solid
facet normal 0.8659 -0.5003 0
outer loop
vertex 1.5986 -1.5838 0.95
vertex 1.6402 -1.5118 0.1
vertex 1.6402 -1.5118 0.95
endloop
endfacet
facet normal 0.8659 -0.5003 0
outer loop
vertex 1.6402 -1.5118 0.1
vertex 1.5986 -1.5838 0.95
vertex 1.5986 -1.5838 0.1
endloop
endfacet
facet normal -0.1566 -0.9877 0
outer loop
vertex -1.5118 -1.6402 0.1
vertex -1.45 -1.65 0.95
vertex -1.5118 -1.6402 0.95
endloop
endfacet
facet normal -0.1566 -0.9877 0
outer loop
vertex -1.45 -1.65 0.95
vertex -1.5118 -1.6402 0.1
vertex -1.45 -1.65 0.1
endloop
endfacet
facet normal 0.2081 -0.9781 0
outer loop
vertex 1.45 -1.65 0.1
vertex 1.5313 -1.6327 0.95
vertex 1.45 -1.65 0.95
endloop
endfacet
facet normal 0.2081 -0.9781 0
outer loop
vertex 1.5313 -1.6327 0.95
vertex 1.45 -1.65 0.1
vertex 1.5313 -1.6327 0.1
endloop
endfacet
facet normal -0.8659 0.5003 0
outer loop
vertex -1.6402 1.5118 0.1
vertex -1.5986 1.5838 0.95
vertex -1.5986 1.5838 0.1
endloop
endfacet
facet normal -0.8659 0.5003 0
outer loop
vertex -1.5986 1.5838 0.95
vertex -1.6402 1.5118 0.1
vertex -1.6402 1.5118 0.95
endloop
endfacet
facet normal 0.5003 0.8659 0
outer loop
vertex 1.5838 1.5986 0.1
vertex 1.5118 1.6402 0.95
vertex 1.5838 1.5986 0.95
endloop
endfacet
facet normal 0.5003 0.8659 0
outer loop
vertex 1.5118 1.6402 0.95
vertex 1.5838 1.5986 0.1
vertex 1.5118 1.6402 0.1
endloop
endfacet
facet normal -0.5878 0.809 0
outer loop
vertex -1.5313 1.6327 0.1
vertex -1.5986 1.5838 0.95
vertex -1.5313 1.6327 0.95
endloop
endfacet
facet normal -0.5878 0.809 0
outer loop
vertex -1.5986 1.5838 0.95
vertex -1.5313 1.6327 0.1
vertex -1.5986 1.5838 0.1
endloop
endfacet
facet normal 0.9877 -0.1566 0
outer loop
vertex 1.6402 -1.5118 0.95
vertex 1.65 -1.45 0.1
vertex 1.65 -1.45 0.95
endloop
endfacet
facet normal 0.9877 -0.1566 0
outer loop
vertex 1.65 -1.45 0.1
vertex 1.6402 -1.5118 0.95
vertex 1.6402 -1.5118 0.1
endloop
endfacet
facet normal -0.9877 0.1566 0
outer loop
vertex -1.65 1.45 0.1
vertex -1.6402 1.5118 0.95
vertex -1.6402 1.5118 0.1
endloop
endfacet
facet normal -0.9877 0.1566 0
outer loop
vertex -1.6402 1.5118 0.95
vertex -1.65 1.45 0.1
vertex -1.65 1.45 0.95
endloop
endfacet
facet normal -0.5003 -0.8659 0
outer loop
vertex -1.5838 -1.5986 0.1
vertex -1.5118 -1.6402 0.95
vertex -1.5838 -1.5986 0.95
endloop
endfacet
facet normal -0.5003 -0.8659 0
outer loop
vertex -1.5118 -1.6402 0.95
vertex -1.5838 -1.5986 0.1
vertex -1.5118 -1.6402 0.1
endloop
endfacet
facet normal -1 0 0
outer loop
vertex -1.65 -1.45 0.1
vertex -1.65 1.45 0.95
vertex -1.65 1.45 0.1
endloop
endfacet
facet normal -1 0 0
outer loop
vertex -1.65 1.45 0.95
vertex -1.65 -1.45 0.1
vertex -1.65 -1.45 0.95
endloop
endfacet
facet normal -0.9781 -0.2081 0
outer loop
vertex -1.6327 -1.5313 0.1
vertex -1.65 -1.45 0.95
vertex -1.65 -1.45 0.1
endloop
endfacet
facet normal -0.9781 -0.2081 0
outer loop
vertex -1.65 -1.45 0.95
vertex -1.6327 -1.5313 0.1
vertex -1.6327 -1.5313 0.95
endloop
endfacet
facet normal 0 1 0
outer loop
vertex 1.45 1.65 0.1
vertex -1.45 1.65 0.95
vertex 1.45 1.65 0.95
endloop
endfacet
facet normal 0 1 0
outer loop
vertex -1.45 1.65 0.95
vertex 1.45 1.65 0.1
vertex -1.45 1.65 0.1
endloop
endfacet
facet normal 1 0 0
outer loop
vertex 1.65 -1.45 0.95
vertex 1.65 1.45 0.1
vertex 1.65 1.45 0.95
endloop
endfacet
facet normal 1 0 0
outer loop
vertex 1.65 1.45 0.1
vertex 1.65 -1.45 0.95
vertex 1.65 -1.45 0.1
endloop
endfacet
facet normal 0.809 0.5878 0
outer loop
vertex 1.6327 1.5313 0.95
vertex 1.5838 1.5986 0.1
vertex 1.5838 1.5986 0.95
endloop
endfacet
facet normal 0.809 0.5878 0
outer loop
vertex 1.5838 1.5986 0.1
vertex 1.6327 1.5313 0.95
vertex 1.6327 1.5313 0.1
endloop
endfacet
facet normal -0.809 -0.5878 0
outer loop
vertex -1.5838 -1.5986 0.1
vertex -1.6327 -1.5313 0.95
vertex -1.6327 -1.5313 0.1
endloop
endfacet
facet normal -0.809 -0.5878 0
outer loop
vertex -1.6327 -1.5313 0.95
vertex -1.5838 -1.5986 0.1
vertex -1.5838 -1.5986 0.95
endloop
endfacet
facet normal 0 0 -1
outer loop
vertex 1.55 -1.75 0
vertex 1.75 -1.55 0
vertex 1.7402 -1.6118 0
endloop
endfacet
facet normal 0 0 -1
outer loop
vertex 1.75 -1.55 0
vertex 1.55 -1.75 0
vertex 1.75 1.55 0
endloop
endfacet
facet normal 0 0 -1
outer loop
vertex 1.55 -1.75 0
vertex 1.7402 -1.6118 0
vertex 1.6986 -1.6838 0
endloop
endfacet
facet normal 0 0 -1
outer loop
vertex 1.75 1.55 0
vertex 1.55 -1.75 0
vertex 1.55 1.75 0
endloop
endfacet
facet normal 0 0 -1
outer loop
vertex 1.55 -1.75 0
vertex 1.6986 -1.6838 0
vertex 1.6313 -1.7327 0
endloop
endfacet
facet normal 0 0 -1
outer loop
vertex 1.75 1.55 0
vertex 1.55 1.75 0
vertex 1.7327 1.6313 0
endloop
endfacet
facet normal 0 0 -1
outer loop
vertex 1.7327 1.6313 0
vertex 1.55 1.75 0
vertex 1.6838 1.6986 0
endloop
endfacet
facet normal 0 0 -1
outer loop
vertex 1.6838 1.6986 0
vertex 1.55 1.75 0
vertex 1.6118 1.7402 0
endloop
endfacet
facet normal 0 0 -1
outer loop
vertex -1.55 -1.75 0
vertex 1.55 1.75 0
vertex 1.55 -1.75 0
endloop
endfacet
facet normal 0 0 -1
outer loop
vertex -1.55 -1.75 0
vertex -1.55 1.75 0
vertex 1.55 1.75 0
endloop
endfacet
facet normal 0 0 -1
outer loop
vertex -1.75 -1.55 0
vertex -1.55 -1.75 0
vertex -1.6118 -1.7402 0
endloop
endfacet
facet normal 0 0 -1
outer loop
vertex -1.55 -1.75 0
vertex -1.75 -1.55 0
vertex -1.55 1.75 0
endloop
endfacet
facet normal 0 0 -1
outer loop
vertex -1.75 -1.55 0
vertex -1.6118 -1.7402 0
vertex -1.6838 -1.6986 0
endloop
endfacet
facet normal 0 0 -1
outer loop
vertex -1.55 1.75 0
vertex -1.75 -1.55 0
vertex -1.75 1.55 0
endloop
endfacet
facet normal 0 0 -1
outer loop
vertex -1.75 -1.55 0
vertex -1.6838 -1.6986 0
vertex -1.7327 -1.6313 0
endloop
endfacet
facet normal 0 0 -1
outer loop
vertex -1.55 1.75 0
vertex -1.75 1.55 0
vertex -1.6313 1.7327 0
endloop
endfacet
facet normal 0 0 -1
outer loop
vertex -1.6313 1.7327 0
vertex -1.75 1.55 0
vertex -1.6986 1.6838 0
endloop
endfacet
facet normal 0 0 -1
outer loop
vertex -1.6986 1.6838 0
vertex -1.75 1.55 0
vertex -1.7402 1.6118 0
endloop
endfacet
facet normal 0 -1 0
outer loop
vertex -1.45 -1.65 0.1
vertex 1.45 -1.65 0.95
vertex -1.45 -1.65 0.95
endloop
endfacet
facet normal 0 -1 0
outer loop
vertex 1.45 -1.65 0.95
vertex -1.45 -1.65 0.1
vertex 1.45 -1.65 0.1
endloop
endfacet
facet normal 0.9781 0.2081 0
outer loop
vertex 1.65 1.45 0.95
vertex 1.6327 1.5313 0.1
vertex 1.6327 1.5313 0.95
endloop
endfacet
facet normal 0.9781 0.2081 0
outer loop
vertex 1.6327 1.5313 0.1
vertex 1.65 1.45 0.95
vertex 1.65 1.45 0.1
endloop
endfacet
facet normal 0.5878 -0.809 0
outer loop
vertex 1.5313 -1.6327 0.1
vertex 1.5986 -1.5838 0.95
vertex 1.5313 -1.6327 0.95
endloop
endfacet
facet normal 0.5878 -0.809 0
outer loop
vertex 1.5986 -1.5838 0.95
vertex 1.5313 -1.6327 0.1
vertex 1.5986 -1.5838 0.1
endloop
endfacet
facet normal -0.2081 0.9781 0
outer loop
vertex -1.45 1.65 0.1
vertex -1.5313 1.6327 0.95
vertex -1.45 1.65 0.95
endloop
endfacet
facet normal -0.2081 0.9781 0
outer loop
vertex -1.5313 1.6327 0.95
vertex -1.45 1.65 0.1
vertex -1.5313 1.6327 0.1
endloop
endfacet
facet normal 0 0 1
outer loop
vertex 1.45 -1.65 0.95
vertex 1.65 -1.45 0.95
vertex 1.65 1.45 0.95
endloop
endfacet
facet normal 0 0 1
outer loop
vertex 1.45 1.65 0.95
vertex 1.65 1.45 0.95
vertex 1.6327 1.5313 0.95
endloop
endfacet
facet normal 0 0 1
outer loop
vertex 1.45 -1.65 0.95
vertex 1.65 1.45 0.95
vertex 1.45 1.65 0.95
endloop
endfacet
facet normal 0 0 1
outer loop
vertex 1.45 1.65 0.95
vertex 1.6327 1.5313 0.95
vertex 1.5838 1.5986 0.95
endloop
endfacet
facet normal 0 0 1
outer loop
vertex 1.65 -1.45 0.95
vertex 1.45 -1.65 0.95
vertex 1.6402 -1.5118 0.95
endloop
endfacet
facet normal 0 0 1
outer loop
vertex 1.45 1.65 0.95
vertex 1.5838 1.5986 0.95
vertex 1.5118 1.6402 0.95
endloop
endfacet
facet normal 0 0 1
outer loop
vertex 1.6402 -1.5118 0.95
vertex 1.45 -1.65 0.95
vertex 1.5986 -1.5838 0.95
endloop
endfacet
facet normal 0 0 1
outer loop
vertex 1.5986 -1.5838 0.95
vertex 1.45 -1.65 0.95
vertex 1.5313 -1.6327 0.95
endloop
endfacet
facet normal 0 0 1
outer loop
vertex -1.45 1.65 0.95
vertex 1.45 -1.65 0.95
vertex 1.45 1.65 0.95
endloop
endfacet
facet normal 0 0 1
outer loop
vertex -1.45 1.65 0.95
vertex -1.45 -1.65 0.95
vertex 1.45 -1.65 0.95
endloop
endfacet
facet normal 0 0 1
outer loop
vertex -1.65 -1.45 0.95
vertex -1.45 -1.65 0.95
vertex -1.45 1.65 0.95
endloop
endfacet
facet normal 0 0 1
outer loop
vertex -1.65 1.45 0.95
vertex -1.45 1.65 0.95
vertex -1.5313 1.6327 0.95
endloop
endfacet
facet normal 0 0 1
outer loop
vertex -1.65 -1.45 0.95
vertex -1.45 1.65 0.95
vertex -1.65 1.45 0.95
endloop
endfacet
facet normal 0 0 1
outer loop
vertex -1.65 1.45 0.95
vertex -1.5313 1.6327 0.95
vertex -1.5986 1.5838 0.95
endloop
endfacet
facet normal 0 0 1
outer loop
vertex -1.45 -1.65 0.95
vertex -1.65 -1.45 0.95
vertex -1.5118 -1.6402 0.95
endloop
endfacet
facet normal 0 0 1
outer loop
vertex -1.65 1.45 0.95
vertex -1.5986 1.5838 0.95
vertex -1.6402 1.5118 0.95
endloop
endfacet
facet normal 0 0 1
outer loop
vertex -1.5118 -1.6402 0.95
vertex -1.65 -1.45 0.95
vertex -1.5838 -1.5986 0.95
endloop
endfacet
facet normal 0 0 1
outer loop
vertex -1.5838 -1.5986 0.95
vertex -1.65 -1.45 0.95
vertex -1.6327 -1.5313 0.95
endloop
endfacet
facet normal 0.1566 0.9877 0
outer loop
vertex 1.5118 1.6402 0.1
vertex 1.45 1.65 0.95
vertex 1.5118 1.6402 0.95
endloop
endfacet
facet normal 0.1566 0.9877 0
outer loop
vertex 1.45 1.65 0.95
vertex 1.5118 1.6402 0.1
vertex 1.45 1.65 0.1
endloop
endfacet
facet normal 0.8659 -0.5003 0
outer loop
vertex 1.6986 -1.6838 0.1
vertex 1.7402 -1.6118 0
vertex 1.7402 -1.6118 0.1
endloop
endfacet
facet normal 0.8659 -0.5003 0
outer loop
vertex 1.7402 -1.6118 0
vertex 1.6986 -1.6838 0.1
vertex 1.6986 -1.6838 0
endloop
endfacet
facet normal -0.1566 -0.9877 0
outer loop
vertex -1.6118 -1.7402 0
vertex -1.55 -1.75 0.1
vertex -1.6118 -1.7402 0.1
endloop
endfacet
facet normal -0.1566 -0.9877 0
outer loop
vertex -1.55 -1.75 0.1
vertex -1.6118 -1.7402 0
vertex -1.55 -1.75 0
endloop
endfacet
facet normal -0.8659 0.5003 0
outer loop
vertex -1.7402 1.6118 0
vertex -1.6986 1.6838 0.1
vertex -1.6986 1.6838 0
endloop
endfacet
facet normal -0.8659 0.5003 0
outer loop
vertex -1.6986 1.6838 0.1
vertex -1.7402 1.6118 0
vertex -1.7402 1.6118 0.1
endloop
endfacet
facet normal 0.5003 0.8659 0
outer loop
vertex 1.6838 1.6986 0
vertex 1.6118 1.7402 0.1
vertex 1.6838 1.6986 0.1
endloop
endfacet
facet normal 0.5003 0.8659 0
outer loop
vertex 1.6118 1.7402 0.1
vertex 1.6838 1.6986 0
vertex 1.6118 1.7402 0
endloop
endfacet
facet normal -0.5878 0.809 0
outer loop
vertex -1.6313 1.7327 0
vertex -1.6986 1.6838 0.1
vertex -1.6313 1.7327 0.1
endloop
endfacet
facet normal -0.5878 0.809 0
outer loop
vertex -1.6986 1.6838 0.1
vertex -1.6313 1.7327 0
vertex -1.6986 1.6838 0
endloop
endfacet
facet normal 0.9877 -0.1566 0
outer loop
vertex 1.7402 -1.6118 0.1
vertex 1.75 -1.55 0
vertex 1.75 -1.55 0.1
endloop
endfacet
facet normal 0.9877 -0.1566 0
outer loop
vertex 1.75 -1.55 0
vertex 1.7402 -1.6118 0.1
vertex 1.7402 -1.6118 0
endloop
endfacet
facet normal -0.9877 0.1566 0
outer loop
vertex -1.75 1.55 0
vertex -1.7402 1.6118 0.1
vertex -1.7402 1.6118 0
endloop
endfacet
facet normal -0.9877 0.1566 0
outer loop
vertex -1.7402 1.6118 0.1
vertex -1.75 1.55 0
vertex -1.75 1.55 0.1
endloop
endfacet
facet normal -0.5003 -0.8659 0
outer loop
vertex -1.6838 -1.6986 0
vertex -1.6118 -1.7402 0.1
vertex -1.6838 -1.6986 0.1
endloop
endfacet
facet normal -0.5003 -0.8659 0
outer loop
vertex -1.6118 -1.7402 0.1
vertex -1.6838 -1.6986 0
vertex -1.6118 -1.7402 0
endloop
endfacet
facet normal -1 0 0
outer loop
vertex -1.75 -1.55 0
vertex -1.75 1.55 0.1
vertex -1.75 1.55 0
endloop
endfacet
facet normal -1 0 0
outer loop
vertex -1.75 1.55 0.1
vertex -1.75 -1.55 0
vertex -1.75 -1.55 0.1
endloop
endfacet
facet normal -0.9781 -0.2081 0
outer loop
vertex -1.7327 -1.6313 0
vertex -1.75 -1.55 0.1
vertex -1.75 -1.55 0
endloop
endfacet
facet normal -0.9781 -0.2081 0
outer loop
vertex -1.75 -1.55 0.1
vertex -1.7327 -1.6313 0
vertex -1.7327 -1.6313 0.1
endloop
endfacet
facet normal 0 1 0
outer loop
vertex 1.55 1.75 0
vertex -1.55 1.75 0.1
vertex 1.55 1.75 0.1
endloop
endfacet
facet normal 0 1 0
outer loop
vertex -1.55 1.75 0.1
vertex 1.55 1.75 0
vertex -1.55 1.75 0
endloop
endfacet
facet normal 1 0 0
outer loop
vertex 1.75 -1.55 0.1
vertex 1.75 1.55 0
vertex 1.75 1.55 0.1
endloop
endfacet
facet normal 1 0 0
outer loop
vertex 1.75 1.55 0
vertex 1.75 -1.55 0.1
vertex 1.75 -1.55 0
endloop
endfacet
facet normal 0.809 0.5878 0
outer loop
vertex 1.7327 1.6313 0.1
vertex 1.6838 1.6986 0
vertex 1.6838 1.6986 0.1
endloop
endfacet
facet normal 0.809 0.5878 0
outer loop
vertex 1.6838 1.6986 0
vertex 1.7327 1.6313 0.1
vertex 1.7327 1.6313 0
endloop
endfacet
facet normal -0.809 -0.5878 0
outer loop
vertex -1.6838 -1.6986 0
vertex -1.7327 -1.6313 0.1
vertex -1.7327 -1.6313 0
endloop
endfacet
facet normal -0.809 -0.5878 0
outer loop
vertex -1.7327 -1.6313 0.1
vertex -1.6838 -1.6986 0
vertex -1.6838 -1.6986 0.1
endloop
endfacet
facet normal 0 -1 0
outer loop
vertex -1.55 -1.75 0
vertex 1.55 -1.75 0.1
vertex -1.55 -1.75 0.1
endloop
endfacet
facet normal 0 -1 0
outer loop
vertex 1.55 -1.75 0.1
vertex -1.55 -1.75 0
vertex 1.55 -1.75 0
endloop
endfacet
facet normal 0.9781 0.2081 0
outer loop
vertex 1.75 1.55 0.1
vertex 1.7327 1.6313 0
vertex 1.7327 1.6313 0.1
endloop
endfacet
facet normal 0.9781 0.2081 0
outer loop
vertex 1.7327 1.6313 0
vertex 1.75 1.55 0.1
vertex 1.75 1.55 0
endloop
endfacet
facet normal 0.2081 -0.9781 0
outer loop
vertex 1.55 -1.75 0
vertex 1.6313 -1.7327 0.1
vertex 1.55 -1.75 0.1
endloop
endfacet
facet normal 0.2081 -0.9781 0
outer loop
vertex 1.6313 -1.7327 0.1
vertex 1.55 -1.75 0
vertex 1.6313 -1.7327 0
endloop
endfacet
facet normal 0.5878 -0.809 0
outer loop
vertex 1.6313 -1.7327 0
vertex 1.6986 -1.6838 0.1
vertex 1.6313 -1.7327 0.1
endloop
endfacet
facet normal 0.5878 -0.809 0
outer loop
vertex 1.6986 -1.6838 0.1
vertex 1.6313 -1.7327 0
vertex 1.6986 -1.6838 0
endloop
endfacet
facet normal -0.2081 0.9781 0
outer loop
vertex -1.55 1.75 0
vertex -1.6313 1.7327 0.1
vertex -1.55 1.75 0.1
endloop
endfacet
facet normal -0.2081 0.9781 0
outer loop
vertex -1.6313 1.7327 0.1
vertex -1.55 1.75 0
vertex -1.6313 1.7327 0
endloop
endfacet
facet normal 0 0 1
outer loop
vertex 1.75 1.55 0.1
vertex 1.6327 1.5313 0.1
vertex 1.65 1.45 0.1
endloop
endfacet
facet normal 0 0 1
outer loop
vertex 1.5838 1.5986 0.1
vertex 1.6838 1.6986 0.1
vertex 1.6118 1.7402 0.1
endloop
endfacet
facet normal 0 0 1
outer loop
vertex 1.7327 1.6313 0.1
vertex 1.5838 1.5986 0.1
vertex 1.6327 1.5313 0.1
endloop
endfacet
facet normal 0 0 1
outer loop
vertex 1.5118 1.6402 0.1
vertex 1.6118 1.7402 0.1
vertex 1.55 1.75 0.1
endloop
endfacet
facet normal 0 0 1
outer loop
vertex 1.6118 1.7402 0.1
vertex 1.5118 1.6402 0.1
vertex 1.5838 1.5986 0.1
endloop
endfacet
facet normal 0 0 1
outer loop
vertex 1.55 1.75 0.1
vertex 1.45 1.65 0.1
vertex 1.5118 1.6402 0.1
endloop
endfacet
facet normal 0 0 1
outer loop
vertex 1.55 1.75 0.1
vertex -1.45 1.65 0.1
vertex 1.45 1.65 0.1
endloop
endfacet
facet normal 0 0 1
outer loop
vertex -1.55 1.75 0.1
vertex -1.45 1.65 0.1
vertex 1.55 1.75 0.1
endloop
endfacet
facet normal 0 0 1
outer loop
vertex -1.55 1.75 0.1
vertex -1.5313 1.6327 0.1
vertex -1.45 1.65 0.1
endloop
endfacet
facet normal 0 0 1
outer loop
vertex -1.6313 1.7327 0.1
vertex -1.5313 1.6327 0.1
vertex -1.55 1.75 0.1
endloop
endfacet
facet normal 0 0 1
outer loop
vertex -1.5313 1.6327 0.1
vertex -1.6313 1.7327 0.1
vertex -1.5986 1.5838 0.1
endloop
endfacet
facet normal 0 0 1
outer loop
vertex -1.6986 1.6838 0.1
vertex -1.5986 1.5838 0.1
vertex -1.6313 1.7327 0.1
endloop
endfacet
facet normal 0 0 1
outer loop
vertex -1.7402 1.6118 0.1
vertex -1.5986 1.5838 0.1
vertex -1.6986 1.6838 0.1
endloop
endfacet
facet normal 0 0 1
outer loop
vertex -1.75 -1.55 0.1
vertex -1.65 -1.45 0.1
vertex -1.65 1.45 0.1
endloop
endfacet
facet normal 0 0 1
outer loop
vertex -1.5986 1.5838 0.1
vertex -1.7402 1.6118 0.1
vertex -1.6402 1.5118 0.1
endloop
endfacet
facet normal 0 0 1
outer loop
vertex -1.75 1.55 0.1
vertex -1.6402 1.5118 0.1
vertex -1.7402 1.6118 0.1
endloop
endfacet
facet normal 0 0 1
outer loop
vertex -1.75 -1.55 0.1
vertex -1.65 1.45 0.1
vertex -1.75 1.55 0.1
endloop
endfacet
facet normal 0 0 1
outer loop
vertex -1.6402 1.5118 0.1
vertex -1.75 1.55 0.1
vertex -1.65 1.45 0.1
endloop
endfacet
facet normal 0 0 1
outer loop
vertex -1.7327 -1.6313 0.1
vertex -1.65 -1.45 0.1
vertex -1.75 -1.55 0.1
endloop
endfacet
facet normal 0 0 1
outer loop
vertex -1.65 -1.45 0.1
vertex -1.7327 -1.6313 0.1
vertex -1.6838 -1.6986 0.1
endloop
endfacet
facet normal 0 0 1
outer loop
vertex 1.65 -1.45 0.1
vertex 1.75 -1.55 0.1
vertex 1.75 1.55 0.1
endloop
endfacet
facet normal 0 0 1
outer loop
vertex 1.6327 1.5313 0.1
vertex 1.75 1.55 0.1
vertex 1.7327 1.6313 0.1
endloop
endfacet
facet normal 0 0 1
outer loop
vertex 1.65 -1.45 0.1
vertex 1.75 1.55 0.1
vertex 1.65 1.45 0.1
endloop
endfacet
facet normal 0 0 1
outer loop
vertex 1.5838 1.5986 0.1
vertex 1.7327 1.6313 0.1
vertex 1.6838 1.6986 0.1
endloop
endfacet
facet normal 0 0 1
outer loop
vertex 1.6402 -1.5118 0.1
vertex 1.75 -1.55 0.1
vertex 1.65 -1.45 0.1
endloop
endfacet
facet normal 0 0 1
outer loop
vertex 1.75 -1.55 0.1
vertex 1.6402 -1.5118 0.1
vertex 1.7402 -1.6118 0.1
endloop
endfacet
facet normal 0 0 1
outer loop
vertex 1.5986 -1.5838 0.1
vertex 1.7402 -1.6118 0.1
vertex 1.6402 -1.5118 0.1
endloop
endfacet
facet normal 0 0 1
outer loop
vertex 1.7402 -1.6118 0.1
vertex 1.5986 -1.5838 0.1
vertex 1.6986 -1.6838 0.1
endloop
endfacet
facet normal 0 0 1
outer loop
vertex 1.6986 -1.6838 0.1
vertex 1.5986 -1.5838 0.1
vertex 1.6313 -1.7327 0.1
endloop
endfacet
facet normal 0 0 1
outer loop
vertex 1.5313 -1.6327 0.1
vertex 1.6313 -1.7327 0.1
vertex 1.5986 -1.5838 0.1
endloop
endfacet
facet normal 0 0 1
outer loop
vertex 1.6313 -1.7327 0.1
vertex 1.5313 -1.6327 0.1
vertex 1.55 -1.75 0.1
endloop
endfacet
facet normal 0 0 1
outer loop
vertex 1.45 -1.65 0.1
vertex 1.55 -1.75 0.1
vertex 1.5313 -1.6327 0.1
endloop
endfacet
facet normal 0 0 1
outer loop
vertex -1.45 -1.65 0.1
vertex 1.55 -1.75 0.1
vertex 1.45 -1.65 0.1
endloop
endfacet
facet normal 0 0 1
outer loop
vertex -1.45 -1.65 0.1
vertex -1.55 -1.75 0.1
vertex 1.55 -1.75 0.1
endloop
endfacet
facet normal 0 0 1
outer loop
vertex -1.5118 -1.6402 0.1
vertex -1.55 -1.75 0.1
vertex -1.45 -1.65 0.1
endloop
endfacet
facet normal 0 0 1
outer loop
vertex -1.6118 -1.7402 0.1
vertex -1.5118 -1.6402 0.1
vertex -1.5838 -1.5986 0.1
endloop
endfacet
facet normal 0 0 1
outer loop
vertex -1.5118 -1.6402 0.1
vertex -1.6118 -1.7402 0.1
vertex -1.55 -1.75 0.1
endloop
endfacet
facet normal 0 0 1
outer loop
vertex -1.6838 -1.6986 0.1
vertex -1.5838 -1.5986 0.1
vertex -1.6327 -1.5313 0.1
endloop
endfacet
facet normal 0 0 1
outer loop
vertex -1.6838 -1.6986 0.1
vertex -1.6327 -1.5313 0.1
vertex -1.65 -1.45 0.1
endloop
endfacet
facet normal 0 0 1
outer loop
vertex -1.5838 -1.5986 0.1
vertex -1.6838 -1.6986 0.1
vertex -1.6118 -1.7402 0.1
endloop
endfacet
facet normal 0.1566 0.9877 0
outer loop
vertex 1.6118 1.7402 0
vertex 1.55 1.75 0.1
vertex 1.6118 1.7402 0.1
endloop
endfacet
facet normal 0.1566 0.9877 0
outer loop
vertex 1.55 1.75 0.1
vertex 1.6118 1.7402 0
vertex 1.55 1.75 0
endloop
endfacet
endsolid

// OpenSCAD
r = 0.2;
$fn = 15;
color([1, 1, 1]) {
  linear_extrude(0.95) offset(r = r) offset(r = -r) square(3.3, center = true);
  linear_extrude(0.10) offset(r = r) offset(r = -r) square(3.5, center = true);
}
